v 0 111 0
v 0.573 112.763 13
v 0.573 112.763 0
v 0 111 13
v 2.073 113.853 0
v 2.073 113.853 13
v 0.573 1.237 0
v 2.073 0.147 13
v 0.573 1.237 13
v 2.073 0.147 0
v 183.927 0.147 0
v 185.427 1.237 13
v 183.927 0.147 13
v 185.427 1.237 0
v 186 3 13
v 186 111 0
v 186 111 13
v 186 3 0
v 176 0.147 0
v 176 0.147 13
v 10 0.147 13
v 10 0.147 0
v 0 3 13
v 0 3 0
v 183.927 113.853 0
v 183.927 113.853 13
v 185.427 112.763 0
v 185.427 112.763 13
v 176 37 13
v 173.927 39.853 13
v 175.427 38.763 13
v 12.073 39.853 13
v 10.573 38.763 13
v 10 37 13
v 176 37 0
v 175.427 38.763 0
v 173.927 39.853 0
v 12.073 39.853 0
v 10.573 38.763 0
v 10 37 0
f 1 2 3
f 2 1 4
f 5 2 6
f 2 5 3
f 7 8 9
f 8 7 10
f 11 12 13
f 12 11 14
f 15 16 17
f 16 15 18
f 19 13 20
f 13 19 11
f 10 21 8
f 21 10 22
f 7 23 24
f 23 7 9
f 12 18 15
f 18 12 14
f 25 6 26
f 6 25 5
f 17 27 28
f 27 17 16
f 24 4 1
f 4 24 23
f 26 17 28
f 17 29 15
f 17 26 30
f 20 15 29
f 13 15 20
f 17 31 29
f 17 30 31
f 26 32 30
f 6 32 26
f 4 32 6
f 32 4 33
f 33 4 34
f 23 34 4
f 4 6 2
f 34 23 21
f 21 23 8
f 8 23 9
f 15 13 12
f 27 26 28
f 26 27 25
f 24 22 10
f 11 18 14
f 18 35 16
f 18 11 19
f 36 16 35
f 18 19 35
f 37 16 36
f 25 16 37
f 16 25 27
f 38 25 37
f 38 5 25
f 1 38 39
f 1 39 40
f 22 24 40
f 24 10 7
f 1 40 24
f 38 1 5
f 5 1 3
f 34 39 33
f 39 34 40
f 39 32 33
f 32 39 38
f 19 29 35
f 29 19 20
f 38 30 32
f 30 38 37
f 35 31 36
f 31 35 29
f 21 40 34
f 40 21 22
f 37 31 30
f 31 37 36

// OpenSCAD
// file: ../../lib/rounded_square.scad
$bleed = 1;
$rounding = 3;

module rounded_square(size, flat_top=false, flat_bottom=false) {
  assert(!(flat_top && flat_bottom), "Flat top and flat bottom are exclusive");

  rounding_height = flat_top || flat_bottom 
    ? $rounding 
    : $rounding * 2;

  offset = flat_bottom ? 0 : $rounding;

  inner_size = [
    size[0] - $rounding * 2,
    size[1] - rounding_height,
  ];

  minkowski() {
    translate([$rounding, offset]) {
      square(inner_size);
    }
    if (flat_top ) {
      difference() {
        circle($rounding);
        translate([-$rounding, 0]) {
          square([$rounding * 2, $rounding]);
        }
      }
    } else if (flat_bottom) {
      difference() {
        circle($rounding);
        translate([-$rounding, -$rounding]) {
          square([$rounding * 2, $rounding]);
        }
      }
    } else {
      circle($rounding);
    }
  }
}
// file: ../../lib/rounded_cube.scad
include <./rounded_square.scad>

$bleed = 1;
$rounding = 3;

// Render a rounded cube
// flat_top: do not round the top edges
// flat_bottom: do not round the bottom edges
// flat: equals flat_top && flat_bottom
// 
// Limitations:
// requires height > $rounding * 2
// flat_top || flat_bottom requires height > $rounding
// flat_top && flat_bottom requires height > $bleed
module rounded_cube(
  size, 
  flat=false, 
  flat_top=false, 
  flat_bottom=false,
  side_rounding=-1
) {
  _flat = flat || (flat_top && flat_bottom);
  _flat_top = flat_top || flat;
  _flat_bottom = flat_bottom || flat;
  _rounding = min($rounding, size[2] / 2);
  _side_rounding = side_rounding > -1 ? side_rounding: $rounding;

  assert(_side_rounding >= $rounding, "side rounding cannot be less than rounding");

  top_height = _flat_top ? 0: _rounding;
  bottom_height = _flat_bottom ? 0: _rounding;

  cube_size = [
    size[0] - _rounding * 2,
    size[1] - _rounding * 2,
    size[2] - (top_height + bottom_height)
  ];

  if (_flat_top && _flat_bottom) {
     linear_extrude(cube_size[2]) {
       rounded_square([size[0], size[1]]);
     }
  } else {
    minkowski() {
      translate([_rounding, _rounding, bottom_height]) {
        if (_side_rounding != _rounding) {
          linear_extrude(cube_size[2]) {
            rounded_square([cube_size[0], cube_size[1]], $rounding=_side_rounding);
          }
        } else {
          cube(cube_size);
        }
      }

      if (_flat_top) {
        difference() {
          sphere(_rounding);
          cylinder(_rounding, _rounding, _rounding);
        }
      } else if (_flat_bottom) {
        difference() {
          sphere(_rounding);
          translate ([0, 0, -_rounding]) {
            cylinder(_rounding, _rounding, _rounding);
          }
        }
      } else {
        sphere(_rounding);
      }
    }
  }
}
// main file
include <../../lib/rounded_cube.scad>

$rounding = 3;
$bleed = 0.01;

size = [
  186,
  114,
  13,
];

inset_x = 10;
inset_y = 40;

cutout_size = [
  size[0] - inset_x * 2,
  inset_y + $rounding + $bleed,
  size[2] + $bleed * 2,
];

difference() {
  rounded_cube(size, flat=true);

  translate([inset_x, -$rounding - $bleed, -$bleed]) {
    rounded_cube(cutout_size, flat=true);
  }
}
